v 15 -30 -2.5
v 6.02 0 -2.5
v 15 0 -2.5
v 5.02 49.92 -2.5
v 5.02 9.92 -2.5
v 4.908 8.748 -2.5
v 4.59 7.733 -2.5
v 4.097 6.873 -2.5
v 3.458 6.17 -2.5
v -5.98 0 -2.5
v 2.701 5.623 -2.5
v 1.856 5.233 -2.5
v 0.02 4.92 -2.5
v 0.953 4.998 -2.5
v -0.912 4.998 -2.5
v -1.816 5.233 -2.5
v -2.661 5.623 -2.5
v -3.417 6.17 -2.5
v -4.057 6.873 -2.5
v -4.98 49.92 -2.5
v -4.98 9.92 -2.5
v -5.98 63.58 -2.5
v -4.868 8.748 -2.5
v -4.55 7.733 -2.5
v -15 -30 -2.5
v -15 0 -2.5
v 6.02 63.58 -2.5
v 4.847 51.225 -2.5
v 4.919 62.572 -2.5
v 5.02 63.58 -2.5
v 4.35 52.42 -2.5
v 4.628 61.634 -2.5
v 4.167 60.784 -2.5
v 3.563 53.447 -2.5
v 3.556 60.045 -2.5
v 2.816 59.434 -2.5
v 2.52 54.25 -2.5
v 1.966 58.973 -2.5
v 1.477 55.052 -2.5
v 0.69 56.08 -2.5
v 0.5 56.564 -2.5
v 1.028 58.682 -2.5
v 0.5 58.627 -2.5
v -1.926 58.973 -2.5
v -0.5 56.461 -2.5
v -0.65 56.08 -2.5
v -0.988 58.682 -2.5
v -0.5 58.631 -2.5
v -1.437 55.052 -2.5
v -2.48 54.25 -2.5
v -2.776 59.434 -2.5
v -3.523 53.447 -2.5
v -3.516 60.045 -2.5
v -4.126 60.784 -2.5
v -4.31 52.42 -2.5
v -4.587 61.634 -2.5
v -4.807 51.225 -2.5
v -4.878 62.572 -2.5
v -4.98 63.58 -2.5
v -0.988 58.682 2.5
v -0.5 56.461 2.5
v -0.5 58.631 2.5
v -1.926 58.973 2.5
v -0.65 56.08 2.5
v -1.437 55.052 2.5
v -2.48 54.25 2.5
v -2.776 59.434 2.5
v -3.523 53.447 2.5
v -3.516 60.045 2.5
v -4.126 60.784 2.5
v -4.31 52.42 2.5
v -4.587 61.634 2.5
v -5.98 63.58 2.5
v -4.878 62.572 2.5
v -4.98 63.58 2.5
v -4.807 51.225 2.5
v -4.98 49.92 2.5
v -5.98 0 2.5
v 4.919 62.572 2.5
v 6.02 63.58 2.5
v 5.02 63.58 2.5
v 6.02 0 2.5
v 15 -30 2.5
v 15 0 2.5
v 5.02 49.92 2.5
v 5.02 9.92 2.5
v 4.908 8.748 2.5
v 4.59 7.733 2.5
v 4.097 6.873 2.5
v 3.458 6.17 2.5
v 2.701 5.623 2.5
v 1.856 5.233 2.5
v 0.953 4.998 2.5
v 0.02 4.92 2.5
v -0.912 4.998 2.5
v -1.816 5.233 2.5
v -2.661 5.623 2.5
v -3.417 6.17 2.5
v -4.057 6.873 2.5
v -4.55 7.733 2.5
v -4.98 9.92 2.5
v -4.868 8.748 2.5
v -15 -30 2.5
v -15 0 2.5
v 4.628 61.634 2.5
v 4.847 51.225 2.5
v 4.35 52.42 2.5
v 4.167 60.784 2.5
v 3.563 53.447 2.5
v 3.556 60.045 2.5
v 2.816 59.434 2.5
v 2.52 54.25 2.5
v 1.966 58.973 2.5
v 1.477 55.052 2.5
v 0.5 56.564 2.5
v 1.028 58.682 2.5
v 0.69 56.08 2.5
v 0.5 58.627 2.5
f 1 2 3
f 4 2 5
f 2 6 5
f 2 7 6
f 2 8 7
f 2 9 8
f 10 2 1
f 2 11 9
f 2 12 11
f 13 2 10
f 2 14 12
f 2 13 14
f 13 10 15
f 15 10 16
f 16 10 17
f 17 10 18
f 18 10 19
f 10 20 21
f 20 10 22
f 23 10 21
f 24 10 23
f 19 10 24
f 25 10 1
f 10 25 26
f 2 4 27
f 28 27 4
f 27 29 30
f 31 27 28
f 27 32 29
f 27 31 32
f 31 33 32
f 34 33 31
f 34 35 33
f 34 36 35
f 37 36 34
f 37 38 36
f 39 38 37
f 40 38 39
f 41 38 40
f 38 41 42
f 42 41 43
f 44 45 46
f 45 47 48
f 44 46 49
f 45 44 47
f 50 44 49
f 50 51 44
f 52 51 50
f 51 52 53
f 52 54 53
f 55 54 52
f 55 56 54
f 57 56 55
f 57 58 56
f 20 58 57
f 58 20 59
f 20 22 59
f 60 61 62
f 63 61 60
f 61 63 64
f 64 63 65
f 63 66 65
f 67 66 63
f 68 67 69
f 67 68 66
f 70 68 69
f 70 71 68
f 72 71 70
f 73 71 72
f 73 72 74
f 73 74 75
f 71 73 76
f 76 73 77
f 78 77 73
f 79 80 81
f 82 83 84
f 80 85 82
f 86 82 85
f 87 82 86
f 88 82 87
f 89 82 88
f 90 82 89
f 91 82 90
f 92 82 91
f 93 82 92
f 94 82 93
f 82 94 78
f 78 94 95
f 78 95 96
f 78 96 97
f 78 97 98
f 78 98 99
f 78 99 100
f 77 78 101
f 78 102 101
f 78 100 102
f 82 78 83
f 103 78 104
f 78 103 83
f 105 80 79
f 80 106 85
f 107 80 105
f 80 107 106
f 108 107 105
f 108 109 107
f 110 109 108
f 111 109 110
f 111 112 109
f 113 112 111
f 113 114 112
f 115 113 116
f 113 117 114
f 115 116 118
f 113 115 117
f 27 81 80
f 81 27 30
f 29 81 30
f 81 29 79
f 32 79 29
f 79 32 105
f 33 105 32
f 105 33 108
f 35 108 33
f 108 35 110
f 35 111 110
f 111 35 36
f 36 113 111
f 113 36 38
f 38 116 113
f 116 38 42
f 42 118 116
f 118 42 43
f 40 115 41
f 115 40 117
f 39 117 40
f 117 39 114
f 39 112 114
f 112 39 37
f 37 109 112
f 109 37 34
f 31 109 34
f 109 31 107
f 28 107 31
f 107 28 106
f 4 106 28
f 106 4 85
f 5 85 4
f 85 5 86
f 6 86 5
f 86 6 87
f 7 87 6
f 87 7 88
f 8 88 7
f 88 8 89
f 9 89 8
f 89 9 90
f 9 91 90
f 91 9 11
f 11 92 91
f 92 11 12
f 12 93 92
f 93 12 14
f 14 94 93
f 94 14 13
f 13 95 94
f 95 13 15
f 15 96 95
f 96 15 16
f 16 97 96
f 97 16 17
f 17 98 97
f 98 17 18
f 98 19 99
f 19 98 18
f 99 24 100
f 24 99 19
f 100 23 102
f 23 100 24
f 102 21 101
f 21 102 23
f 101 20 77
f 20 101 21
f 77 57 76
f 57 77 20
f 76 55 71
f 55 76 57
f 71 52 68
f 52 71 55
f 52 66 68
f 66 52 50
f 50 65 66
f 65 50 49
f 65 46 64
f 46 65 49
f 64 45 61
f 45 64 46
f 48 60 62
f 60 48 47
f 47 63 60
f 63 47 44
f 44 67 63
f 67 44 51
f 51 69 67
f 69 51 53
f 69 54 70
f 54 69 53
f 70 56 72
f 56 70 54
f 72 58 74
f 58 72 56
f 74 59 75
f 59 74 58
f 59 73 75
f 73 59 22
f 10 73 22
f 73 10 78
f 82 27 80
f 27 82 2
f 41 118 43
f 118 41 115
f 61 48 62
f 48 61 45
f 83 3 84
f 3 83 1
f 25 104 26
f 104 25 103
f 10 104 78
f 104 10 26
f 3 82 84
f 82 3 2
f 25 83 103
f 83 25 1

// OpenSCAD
union() {
    difference() {
        translate([-6.1,-.2,0])
        linear_extrude(height = 5, center = true)
        import(file = "thread-release-clip.dxf");
        
        #translate([0,58,0])
        cube([1,10,10], center = true);
    }
    
    translate([0,-15,0])
    cube([30,30,5], center = true);
}
